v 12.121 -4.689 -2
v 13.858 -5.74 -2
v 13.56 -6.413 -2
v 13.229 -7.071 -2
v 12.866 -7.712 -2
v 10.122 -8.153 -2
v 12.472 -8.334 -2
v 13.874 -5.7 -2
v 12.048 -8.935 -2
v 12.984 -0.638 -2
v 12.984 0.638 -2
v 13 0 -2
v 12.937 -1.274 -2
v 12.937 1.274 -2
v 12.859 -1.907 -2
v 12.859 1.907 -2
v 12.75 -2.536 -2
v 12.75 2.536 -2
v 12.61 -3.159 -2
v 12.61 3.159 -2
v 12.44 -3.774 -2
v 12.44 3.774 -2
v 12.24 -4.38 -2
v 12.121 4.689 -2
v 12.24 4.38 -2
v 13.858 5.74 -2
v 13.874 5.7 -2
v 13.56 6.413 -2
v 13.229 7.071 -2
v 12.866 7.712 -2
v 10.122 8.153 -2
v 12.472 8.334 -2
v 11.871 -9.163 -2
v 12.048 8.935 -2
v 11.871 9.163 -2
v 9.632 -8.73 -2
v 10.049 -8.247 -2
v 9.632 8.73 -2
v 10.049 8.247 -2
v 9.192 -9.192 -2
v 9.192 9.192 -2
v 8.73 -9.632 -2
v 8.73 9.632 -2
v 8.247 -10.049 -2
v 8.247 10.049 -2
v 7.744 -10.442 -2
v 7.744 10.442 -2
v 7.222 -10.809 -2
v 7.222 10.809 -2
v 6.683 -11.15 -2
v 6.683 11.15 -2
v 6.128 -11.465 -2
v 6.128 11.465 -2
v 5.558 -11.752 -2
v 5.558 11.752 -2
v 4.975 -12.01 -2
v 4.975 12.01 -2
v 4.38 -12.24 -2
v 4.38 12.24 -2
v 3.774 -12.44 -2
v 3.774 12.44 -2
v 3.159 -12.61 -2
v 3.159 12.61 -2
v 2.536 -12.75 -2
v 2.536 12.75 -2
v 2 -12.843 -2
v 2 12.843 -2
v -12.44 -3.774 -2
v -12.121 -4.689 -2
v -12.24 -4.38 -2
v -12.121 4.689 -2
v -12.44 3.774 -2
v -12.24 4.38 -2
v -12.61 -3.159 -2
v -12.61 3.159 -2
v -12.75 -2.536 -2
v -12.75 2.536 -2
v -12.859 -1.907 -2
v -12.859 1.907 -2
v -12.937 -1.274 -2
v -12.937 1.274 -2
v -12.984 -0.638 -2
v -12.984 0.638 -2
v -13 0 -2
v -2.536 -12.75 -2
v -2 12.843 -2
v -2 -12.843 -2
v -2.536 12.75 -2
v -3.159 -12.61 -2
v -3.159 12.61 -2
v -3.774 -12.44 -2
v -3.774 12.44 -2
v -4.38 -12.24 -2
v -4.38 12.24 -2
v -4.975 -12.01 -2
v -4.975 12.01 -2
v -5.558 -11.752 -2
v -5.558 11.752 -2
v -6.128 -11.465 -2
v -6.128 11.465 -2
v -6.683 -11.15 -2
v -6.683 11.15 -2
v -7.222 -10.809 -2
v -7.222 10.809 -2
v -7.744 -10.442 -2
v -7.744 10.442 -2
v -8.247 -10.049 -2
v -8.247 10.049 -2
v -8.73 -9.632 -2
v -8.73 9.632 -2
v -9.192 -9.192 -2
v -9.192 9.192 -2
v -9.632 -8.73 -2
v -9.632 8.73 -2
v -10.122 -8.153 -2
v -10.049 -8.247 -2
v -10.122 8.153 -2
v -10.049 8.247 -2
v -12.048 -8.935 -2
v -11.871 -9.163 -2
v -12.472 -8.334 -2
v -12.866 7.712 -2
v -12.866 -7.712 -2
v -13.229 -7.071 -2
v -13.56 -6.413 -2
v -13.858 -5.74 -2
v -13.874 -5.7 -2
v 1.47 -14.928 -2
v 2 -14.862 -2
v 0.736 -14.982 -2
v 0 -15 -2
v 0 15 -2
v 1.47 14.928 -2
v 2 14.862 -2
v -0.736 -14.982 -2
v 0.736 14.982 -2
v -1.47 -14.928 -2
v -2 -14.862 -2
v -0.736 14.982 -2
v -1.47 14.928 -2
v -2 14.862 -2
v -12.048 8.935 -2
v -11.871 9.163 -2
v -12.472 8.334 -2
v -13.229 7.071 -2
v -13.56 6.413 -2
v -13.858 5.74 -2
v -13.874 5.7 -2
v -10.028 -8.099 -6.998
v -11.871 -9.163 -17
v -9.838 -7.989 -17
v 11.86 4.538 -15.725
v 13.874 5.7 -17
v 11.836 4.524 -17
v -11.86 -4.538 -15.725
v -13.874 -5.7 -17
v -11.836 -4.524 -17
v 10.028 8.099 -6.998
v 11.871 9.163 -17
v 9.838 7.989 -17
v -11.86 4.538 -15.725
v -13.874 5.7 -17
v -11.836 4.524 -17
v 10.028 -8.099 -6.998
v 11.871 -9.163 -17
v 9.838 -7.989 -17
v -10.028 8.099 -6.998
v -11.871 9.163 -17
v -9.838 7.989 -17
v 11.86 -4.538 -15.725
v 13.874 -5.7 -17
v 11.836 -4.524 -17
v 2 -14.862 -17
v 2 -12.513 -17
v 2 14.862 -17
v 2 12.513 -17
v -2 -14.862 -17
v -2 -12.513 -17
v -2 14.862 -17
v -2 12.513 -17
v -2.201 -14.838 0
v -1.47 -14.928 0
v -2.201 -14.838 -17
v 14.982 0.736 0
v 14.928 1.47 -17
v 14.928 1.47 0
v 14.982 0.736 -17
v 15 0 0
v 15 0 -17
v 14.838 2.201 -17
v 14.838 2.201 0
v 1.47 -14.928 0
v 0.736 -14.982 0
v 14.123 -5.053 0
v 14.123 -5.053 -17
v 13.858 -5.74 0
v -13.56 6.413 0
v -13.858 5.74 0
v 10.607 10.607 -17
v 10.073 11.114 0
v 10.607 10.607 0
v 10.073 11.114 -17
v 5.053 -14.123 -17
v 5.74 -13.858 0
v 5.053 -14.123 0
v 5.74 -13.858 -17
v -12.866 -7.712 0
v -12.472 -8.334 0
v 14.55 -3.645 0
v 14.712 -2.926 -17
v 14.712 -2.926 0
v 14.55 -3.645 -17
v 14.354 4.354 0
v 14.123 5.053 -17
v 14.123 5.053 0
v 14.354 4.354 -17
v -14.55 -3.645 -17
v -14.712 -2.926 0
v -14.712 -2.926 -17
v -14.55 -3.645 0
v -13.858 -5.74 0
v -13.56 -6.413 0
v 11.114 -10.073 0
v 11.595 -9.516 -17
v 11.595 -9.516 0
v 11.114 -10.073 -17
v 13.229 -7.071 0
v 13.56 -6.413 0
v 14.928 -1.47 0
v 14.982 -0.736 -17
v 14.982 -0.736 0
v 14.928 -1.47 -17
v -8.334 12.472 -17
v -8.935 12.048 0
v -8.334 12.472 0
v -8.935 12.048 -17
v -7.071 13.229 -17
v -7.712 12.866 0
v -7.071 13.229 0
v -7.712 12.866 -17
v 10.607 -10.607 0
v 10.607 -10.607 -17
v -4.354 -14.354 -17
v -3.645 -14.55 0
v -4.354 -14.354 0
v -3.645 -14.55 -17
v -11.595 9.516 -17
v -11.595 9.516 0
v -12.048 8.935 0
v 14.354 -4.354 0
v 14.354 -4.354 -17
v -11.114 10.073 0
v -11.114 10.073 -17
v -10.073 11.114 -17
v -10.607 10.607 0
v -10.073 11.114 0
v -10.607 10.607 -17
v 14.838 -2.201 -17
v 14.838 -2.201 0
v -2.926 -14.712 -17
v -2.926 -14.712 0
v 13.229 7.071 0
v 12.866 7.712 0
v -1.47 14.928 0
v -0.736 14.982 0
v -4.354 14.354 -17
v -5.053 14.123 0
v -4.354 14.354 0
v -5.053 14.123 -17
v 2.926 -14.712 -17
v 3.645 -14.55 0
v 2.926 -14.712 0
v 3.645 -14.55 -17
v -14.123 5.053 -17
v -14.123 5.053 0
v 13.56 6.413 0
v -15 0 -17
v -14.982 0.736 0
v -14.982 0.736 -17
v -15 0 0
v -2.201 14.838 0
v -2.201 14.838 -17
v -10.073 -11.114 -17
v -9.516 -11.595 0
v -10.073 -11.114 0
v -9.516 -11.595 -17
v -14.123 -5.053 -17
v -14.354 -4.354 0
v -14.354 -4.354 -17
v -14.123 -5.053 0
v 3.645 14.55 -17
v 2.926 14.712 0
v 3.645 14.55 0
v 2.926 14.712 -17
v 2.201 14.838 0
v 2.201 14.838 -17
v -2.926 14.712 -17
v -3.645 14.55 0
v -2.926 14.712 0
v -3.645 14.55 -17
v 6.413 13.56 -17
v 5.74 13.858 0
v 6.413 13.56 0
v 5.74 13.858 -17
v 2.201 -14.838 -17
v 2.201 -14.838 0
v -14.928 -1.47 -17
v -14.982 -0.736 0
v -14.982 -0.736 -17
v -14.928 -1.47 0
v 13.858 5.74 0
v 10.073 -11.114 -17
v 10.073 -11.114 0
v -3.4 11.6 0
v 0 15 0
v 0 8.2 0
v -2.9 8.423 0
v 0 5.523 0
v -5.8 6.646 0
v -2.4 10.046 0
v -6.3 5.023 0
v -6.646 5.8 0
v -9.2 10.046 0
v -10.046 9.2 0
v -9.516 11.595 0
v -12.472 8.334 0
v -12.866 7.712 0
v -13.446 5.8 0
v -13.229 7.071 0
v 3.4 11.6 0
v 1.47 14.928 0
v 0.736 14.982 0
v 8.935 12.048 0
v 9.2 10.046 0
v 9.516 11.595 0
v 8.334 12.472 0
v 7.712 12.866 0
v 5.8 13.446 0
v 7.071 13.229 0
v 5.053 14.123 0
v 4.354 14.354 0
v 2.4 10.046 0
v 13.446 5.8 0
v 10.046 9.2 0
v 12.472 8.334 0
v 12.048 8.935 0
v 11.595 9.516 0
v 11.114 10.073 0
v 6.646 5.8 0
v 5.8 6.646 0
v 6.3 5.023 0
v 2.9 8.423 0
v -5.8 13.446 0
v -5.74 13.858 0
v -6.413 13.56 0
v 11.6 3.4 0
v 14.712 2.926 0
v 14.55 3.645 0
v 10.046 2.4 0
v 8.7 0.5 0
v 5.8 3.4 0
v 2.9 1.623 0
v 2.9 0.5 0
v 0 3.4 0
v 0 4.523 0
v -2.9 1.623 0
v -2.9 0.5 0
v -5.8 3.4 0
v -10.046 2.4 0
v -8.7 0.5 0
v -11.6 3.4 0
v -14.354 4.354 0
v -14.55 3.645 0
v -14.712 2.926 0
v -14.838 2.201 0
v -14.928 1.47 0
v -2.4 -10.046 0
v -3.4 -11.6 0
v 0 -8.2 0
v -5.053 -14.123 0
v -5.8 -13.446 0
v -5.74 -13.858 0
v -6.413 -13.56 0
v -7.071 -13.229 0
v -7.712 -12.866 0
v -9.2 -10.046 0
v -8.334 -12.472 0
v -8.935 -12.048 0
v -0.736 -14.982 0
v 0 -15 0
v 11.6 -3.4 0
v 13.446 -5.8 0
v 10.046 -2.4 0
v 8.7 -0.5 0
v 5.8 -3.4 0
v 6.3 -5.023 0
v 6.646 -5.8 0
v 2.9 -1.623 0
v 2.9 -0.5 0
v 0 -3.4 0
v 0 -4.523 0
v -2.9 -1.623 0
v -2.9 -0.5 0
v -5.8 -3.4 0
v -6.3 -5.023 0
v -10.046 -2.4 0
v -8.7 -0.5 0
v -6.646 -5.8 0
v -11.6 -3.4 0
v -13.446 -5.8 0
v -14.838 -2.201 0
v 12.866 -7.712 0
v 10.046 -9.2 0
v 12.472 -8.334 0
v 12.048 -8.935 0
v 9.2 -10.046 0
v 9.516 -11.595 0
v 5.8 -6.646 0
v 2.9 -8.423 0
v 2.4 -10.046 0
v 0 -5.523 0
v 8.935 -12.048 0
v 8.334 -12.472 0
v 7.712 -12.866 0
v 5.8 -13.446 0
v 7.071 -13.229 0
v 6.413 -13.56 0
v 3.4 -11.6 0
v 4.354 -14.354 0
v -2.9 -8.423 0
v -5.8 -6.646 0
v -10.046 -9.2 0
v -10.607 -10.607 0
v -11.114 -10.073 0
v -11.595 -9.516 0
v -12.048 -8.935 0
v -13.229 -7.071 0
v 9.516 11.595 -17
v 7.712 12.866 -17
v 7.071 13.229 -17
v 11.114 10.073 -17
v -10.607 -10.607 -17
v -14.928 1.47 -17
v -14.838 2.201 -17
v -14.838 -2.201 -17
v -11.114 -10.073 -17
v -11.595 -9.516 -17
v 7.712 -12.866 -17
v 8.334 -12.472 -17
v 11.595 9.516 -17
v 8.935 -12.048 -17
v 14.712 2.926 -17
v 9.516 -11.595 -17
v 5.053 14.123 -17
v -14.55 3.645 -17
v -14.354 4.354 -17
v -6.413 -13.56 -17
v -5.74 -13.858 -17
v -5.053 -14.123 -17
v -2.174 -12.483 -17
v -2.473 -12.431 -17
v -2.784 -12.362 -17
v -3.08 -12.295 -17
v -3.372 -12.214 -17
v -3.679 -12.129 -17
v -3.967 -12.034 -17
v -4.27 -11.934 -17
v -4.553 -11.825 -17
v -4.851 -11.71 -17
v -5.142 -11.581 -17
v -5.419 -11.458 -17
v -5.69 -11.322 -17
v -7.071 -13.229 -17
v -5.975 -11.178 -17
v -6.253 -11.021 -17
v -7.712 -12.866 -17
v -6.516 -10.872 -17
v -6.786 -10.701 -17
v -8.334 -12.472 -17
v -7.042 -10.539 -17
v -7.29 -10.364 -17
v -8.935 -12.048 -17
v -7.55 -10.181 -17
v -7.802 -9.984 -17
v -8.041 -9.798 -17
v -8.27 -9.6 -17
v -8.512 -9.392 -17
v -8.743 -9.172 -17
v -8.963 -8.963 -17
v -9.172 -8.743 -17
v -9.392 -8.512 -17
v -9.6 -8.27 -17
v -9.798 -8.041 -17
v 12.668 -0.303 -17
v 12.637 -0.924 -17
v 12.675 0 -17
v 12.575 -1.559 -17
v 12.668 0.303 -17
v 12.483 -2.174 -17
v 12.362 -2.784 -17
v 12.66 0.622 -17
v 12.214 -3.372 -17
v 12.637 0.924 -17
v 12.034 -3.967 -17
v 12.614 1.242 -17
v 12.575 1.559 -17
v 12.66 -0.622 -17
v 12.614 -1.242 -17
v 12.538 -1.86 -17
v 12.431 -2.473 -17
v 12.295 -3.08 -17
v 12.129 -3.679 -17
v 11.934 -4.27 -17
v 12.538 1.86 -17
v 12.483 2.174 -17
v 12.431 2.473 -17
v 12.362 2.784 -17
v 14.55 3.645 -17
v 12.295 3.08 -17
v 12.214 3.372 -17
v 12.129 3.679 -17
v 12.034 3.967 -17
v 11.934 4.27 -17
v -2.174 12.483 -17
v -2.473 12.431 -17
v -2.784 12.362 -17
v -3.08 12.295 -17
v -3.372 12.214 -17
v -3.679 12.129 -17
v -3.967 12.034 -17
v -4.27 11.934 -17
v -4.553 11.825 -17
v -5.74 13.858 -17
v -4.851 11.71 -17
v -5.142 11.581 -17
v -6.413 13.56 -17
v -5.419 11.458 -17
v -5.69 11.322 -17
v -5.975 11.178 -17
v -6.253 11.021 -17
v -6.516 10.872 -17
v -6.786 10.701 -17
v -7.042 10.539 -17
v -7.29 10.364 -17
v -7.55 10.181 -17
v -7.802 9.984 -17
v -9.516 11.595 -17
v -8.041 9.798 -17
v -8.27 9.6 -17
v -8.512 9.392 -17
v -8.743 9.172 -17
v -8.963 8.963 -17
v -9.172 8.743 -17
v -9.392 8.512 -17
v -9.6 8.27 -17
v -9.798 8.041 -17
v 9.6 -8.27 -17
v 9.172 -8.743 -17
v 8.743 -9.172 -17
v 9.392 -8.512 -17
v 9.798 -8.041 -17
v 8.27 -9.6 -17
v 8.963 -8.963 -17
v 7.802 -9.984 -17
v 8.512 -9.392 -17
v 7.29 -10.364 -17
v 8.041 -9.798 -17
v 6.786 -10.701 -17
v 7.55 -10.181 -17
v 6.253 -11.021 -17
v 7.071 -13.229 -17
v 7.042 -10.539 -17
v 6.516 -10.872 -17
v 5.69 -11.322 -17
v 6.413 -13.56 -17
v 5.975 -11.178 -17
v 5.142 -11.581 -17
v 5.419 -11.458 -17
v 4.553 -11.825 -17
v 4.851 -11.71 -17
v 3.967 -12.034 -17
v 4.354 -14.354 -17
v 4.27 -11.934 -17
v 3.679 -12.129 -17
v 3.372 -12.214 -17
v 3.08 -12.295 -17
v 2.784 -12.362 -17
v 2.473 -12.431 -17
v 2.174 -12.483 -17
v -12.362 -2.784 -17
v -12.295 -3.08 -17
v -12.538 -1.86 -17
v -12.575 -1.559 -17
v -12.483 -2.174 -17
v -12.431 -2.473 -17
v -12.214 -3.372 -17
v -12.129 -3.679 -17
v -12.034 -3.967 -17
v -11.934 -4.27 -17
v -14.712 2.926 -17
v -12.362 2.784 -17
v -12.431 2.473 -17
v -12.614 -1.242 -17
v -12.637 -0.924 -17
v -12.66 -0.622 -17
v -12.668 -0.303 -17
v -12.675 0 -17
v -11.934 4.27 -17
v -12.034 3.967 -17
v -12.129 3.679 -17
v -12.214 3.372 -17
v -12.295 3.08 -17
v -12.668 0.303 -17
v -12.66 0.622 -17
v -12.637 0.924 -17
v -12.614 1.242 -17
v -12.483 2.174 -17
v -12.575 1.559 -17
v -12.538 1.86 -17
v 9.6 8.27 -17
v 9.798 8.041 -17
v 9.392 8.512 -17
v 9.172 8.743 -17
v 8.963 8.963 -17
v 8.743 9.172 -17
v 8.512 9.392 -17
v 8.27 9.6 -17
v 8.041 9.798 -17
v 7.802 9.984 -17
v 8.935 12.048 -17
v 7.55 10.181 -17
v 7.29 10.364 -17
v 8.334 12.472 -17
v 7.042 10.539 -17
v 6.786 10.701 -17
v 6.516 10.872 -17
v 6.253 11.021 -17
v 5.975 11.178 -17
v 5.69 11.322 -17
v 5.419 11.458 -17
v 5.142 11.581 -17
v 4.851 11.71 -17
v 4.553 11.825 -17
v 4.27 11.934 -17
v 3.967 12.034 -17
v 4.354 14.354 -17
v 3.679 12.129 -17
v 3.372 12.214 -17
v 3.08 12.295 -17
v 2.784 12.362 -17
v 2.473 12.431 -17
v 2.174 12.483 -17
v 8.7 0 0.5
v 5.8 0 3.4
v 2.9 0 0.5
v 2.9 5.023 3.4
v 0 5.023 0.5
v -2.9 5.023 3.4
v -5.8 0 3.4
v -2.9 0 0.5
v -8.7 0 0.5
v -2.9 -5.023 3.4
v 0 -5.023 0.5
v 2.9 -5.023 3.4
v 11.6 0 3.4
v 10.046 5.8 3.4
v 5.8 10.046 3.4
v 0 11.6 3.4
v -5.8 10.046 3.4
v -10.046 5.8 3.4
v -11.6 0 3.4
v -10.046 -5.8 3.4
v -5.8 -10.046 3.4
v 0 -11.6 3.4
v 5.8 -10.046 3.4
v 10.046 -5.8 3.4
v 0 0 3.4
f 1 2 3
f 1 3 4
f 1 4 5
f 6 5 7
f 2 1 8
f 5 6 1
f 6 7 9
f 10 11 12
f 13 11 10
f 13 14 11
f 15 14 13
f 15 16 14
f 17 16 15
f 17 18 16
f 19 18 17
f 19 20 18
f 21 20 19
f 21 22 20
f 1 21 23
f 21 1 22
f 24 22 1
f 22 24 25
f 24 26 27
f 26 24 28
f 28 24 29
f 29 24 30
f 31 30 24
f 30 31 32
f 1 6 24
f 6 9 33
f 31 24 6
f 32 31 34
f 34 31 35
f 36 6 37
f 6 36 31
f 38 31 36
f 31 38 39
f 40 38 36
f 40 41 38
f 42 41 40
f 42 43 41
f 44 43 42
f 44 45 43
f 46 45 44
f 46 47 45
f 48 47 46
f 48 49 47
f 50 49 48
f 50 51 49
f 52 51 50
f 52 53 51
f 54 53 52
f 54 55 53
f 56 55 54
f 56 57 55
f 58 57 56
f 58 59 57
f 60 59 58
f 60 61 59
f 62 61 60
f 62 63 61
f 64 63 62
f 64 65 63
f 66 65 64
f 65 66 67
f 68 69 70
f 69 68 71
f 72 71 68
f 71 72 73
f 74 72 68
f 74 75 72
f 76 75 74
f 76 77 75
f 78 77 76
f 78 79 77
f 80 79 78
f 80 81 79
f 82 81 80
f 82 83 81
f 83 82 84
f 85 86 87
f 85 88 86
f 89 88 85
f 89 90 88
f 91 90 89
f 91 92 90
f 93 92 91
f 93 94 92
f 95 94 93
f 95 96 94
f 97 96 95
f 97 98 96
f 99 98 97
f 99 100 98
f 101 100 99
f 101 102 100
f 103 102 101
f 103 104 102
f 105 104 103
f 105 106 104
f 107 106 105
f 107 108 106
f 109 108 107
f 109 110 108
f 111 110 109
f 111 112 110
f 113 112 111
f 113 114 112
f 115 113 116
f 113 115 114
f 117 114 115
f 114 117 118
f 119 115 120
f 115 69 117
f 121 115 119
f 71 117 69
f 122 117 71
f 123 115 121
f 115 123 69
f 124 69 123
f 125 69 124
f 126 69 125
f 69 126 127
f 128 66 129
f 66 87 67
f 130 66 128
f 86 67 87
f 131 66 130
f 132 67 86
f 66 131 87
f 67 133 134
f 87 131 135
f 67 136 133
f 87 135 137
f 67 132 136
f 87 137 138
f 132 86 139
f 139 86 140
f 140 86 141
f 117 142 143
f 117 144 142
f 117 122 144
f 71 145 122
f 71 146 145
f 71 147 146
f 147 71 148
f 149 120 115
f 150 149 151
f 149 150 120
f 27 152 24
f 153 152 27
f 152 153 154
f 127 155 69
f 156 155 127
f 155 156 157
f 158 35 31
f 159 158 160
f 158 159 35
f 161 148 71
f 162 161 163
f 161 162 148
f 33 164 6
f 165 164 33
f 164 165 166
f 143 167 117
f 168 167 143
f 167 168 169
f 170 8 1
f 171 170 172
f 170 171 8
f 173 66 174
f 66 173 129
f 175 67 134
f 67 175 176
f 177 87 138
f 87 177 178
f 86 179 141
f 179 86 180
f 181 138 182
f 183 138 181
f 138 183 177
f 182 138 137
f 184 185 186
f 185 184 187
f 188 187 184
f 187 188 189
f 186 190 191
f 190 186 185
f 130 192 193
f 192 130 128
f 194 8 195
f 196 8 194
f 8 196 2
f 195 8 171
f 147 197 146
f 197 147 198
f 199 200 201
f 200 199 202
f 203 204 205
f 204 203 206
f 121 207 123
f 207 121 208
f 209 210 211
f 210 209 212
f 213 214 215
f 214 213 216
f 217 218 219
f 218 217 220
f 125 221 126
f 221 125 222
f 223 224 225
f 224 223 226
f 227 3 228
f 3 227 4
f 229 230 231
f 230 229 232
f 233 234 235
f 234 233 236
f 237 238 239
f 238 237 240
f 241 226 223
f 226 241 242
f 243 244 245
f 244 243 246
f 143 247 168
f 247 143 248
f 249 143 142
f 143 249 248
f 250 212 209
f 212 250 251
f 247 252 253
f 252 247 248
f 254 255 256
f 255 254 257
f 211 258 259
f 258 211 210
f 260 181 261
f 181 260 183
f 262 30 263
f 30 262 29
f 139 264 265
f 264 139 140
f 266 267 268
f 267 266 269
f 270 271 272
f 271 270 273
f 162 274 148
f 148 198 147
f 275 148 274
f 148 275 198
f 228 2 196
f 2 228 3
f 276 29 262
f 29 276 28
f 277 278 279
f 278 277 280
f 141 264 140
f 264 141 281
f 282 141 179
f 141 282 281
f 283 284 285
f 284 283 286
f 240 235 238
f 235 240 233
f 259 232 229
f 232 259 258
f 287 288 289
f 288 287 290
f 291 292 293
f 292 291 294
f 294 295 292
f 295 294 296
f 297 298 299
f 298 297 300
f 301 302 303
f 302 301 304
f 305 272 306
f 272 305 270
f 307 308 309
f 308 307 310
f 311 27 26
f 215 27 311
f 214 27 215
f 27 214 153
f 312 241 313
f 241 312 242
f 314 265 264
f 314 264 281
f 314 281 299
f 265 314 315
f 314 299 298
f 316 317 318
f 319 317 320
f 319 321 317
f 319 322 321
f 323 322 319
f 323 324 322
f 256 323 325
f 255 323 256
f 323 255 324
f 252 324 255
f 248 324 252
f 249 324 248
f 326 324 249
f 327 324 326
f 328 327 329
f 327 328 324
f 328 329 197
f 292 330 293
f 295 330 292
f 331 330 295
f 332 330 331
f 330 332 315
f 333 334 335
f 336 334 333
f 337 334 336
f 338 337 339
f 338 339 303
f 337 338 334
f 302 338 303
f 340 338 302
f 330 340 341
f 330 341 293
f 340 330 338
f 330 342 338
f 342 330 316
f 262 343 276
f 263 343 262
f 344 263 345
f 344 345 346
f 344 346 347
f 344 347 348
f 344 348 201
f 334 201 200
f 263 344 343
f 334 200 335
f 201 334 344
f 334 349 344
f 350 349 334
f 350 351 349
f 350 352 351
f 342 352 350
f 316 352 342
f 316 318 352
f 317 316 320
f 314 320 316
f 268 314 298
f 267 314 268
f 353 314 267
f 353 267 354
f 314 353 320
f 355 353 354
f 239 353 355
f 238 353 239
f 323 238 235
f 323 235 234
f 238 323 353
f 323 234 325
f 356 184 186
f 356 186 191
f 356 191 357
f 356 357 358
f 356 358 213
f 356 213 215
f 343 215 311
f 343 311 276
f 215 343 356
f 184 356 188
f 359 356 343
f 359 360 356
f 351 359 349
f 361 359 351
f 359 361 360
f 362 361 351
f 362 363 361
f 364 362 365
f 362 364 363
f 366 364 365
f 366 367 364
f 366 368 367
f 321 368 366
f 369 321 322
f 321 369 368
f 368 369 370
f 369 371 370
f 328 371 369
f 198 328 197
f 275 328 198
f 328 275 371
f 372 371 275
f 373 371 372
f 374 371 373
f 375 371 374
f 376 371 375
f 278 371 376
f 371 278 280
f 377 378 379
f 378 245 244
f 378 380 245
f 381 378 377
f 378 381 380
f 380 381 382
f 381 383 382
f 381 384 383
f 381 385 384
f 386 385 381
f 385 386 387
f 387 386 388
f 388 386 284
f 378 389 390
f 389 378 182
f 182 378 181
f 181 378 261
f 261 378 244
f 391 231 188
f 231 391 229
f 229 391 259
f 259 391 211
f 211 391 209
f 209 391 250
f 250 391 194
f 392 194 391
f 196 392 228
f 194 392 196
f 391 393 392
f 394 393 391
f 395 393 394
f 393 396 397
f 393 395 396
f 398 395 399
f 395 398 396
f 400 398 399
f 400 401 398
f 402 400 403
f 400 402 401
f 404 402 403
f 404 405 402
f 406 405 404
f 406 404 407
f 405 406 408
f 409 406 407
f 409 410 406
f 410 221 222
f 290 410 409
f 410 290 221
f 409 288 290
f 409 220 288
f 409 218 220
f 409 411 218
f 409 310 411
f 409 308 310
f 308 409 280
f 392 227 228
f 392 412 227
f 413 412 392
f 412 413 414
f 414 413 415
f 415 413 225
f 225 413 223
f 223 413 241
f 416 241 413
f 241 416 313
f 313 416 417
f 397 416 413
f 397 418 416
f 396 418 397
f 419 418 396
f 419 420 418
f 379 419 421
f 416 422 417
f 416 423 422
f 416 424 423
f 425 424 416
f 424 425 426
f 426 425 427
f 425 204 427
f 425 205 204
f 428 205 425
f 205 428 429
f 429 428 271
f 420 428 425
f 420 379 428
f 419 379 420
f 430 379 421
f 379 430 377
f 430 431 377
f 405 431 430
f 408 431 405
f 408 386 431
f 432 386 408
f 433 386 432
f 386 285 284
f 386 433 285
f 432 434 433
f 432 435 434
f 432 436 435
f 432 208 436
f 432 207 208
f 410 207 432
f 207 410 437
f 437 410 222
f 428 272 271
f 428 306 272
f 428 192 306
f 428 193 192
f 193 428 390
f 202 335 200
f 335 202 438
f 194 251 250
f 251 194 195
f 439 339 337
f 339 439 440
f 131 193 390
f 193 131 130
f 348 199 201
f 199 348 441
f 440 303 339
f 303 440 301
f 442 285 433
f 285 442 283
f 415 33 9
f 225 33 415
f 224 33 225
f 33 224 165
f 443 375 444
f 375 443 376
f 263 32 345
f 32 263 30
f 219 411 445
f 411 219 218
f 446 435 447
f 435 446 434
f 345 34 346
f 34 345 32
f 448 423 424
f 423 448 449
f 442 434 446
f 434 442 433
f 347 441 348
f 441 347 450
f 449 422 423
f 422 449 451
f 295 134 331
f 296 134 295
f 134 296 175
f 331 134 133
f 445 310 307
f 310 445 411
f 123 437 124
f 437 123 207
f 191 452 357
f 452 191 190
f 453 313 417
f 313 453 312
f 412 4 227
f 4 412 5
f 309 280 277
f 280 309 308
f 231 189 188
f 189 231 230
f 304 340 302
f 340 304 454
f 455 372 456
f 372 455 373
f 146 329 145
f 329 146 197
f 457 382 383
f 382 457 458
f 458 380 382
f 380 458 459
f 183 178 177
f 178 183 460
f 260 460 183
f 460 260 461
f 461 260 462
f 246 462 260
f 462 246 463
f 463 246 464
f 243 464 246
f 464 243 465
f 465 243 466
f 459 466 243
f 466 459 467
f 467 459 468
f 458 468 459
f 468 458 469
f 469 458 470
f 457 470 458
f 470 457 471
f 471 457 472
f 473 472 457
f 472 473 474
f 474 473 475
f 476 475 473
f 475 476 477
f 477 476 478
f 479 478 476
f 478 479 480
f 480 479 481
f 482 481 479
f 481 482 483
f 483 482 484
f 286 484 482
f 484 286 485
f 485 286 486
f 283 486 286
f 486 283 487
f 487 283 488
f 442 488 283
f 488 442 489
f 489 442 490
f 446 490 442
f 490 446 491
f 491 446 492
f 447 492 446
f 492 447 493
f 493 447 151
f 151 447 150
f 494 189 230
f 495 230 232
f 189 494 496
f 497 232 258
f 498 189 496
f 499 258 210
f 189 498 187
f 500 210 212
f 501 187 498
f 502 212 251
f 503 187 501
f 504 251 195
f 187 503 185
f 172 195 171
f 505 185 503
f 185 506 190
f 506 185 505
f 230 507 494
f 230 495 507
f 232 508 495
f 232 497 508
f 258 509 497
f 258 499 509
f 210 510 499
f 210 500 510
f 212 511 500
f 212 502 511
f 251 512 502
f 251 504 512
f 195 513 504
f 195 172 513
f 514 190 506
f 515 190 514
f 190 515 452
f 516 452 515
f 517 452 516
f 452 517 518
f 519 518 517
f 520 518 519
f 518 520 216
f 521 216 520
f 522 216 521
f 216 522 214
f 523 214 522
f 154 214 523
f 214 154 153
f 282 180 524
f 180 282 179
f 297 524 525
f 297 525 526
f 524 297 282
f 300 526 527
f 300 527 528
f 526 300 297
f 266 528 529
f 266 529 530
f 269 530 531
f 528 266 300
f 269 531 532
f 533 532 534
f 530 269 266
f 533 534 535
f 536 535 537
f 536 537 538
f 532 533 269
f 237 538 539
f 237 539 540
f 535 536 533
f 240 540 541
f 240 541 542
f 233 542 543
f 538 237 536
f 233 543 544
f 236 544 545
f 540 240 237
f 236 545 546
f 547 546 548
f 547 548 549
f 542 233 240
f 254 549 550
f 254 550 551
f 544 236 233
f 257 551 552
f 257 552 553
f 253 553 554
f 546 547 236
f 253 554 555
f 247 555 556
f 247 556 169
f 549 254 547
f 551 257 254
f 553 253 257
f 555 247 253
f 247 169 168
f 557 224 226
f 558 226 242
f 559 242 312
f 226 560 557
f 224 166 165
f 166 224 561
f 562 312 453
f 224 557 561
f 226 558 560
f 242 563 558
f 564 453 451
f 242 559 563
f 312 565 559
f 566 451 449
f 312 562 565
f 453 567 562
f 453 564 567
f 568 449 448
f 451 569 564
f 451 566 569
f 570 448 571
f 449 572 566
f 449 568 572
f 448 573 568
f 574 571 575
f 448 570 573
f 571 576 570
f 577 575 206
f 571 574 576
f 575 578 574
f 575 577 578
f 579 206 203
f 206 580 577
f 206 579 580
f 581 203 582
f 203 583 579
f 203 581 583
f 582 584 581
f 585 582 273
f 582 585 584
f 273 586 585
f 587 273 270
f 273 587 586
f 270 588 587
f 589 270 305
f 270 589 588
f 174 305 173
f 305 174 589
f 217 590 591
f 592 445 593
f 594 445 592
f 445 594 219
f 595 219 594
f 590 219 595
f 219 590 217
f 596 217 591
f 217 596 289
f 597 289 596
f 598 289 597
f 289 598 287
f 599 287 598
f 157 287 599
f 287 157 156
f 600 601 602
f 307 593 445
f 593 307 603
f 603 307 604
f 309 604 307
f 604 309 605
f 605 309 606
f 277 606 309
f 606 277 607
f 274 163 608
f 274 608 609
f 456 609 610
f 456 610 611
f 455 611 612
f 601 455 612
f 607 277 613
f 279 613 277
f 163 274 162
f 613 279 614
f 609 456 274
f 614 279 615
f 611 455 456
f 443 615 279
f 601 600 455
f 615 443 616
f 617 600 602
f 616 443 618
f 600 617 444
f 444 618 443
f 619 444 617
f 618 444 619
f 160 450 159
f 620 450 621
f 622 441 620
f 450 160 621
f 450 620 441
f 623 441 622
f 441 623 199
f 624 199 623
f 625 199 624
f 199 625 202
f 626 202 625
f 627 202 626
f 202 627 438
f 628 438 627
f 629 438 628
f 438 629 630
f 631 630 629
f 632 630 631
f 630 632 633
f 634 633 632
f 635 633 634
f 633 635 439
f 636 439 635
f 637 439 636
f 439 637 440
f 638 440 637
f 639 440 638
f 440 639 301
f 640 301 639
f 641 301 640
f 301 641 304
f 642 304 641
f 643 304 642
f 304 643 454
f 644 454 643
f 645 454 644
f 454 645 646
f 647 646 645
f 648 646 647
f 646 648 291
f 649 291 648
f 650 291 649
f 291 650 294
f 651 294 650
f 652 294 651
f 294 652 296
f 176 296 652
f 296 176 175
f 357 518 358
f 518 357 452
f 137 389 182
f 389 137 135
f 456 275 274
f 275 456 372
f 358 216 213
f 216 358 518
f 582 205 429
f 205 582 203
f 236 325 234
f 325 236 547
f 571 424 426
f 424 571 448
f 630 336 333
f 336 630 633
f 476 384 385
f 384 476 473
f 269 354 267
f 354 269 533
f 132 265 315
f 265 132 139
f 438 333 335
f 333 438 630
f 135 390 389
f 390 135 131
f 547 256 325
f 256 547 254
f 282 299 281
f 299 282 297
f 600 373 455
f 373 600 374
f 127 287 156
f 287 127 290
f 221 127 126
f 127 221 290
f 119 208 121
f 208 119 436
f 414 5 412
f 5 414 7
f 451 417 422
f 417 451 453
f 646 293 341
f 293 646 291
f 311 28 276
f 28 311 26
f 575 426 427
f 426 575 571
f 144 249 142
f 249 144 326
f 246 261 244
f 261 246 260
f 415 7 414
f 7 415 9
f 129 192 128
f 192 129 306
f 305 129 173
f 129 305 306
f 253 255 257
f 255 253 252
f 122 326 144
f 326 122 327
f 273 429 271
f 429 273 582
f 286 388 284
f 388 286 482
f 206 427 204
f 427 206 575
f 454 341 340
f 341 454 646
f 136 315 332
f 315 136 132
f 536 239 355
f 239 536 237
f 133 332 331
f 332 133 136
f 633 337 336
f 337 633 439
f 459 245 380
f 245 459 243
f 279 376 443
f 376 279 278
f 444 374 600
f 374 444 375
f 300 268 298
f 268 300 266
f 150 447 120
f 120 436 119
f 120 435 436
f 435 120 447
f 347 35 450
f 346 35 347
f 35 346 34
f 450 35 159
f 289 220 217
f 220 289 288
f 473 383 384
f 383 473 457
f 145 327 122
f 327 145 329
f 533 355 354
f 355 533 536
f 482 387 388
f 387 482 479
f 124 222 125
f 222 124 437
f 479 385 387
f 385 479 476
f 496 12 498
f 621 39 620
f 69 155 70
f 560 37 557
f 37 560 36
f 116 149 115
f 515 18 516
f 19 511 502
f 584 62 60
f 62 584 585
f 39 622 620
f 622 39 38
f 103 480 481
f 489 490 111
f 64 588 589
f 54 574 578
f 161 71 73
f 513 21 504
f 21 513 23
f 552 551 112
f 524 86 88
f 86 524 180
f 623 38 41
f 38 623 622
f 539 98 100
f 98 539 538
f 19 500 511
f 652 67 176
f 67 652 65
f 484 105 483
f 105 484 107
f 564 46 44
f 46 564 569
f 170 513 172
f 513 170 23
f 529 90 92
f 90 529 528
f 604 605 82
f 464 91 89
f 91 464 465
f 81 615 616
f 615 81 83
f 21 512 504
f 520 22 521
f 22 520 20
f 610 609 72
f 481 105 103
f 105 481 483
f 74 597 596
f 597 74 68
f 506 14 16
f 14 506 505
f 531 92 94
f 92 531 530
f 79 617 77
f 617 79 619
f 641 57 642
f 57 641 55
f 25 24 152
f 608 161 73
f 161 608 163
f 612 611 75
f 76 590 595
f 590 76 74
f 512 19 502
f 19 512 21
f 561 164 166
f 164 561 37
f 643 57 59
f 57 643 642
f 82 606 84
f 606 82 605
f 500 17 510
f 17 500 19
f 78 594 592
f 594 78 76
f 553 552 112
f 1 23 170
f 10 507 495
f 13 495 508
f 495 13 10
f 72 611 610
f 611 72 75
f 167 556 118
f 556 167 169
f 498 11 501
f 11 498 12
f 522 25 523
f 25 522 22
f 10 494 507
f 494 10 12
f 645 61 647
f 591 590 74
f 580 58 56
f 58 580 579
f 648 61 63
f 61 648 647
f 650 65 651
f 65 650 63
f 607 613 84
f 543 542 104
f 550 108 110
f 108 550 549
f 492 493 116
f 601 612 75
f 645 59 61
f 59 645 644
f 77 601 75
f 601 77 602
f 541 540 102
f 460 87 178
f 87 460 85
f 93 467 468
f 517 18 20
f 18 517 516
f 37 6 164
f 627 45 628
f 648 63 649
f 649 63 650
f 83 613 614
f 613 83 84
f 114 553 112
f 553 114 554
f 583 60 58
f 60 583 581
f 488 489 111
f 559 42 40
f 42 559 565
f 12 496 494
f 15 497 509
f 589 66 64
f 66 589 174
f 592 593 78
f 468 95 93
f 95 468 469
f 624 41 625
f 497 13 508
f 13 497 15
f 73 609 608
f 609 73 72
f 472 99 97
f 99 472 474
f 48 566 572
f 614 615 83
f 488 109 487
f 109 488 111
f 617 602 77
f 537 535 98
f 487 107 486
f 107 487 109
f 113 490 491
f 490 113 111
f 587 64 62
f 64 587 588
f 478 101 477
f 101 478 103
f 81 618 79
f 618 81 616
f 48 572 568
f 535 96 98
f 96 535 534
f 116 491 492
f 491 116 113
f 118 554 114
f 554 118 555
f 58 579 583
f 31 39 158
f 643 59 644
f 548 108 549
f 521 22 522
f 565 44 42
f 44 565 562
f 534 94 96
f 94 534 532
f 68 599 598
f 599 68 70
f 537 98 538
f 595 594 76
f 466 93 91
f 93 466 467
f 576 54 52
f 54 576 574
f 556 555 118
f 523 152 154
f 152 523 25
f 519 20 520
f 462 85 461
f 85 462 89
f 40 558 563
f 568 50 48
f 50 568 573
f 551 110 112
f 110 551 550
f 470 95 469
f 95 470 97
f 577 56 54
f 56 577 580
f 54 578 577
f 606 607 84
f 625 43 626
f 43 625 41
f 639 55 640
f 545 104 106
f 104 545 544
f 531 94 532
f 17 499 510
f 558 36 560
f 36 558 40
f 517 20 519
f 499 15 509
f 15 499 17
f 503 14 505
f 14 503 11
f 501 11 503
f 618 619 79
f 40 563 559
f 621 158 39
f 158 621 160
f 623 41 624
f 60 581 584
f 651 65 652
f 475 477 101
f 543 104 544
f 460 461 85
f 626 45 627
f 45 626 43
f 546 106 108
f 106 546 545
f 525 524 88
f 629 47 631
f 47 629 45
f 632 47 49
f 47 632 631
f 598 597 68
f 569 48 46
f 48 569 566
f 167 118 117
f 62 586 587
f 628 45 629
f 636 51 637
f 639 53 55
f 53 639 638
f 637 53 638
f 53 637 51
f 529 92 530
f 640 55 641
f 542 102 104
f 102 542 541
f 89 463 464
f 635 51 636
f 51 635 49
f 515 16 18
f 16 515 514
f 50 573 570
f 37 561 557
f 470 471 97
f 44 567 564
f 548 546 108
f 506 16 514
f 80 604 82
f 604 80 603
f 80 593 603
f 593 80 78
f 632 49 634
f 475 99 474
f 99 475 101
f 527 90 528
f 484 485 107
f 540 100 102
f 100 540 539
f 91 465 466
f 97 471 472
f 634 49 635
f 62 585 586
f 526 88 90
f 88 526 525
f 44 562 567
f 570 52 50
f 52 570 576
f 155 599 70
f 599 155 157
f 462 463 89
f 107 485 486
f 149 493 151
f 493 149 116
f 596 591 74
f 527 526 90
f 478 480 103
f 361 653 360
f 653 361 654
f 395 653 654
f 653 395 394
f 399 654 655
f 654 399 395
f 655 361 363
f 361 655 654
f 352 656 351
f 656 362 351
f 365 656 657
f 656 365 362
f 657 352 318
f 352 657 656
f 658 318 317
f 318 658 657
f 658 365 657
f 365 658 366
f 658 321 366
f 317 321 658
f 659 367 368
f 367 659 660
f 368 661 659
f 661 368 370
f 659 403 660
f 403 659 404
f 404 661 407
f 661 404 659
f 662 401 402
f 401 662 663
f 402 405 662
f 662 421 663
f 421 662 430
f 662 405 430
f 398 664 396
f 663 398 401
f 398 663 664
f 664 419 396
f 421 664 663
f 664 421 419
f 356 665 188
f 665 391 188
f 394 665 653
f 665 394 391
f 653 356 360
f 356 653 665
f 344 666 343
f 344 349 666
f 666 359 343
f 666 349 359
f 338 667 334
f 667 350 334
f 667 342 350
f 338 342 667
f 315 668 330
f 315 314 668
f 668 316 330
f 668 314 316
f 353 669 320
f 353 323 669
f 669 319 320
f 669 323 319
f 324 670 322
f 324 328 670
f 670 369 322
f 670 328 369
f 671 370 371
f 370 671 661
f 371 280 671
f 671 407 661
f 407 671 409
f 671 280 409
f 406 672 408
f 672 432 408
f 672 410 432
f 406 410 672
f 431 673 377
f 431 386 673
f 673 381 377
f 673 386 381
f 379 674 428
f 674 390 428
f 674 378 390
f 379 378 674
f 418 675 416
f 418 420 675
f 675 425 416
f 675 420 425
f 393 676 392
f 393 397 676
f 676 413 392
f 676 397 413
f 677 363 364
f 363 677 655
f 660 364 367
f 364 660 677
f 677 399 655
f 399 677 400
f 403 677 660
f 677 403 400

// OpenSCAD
hammer_head_diameter = 26;
hammer_head_length = 15;
wall_thickness = 2; // [0:0.1:5]
spike_length = 3.4; // [0:0.1:10]
spikes_per_circle = 12; // [4:20]

/* [Hidden] */
item_diameter = hammer_head_diameter+wall_thickness*2;
$fn=128;

// Hammer base
translate([0,0,-hammer_head_length-wall_thickness])
    difference(){
        cylinder(d=item_diameter, h=hammer_head_length+wall_thickness);
        cylinder(d1=hammer_head_diameter*.95, d2=hammer_head_diameter, h=hammer_head_length*2, center=true);
        for (i=[1:3]) 
            rotate([0,0,i*(360/3)])
                cube([wall_thickness*2, hammer_head_diameter*2, hammer_head_length*2], center=true);
}

module spike(size) { cylinder(r1=size, r2=0, h=size, $fn=4); }

// Central spike
spike(spike_length);

// Inner spike circle, if there's a place for it
if (item_diameter > spike_length*8.5)
    for (i=[0:spikes_per_circle/2]) 
        rotate([0,0,i*(360/spikes_per_circle*2)])
            translate([item_diameter/4-spike_length/2,0,0])
                rotate([0,0,-i*(360/spikes_per_circle*2)])
                    spike(spike_length);

// Outer spike circle
for (i=[0:spikes_per_circle]) 
    rotate([0,0,i*(360/spikes_per_circle)])
        translate([item_diameter/2-spike_length, 0, 0])
            rotate([0,0,-i*(360/spikes_per_circle)])
                spike(spike_length);
